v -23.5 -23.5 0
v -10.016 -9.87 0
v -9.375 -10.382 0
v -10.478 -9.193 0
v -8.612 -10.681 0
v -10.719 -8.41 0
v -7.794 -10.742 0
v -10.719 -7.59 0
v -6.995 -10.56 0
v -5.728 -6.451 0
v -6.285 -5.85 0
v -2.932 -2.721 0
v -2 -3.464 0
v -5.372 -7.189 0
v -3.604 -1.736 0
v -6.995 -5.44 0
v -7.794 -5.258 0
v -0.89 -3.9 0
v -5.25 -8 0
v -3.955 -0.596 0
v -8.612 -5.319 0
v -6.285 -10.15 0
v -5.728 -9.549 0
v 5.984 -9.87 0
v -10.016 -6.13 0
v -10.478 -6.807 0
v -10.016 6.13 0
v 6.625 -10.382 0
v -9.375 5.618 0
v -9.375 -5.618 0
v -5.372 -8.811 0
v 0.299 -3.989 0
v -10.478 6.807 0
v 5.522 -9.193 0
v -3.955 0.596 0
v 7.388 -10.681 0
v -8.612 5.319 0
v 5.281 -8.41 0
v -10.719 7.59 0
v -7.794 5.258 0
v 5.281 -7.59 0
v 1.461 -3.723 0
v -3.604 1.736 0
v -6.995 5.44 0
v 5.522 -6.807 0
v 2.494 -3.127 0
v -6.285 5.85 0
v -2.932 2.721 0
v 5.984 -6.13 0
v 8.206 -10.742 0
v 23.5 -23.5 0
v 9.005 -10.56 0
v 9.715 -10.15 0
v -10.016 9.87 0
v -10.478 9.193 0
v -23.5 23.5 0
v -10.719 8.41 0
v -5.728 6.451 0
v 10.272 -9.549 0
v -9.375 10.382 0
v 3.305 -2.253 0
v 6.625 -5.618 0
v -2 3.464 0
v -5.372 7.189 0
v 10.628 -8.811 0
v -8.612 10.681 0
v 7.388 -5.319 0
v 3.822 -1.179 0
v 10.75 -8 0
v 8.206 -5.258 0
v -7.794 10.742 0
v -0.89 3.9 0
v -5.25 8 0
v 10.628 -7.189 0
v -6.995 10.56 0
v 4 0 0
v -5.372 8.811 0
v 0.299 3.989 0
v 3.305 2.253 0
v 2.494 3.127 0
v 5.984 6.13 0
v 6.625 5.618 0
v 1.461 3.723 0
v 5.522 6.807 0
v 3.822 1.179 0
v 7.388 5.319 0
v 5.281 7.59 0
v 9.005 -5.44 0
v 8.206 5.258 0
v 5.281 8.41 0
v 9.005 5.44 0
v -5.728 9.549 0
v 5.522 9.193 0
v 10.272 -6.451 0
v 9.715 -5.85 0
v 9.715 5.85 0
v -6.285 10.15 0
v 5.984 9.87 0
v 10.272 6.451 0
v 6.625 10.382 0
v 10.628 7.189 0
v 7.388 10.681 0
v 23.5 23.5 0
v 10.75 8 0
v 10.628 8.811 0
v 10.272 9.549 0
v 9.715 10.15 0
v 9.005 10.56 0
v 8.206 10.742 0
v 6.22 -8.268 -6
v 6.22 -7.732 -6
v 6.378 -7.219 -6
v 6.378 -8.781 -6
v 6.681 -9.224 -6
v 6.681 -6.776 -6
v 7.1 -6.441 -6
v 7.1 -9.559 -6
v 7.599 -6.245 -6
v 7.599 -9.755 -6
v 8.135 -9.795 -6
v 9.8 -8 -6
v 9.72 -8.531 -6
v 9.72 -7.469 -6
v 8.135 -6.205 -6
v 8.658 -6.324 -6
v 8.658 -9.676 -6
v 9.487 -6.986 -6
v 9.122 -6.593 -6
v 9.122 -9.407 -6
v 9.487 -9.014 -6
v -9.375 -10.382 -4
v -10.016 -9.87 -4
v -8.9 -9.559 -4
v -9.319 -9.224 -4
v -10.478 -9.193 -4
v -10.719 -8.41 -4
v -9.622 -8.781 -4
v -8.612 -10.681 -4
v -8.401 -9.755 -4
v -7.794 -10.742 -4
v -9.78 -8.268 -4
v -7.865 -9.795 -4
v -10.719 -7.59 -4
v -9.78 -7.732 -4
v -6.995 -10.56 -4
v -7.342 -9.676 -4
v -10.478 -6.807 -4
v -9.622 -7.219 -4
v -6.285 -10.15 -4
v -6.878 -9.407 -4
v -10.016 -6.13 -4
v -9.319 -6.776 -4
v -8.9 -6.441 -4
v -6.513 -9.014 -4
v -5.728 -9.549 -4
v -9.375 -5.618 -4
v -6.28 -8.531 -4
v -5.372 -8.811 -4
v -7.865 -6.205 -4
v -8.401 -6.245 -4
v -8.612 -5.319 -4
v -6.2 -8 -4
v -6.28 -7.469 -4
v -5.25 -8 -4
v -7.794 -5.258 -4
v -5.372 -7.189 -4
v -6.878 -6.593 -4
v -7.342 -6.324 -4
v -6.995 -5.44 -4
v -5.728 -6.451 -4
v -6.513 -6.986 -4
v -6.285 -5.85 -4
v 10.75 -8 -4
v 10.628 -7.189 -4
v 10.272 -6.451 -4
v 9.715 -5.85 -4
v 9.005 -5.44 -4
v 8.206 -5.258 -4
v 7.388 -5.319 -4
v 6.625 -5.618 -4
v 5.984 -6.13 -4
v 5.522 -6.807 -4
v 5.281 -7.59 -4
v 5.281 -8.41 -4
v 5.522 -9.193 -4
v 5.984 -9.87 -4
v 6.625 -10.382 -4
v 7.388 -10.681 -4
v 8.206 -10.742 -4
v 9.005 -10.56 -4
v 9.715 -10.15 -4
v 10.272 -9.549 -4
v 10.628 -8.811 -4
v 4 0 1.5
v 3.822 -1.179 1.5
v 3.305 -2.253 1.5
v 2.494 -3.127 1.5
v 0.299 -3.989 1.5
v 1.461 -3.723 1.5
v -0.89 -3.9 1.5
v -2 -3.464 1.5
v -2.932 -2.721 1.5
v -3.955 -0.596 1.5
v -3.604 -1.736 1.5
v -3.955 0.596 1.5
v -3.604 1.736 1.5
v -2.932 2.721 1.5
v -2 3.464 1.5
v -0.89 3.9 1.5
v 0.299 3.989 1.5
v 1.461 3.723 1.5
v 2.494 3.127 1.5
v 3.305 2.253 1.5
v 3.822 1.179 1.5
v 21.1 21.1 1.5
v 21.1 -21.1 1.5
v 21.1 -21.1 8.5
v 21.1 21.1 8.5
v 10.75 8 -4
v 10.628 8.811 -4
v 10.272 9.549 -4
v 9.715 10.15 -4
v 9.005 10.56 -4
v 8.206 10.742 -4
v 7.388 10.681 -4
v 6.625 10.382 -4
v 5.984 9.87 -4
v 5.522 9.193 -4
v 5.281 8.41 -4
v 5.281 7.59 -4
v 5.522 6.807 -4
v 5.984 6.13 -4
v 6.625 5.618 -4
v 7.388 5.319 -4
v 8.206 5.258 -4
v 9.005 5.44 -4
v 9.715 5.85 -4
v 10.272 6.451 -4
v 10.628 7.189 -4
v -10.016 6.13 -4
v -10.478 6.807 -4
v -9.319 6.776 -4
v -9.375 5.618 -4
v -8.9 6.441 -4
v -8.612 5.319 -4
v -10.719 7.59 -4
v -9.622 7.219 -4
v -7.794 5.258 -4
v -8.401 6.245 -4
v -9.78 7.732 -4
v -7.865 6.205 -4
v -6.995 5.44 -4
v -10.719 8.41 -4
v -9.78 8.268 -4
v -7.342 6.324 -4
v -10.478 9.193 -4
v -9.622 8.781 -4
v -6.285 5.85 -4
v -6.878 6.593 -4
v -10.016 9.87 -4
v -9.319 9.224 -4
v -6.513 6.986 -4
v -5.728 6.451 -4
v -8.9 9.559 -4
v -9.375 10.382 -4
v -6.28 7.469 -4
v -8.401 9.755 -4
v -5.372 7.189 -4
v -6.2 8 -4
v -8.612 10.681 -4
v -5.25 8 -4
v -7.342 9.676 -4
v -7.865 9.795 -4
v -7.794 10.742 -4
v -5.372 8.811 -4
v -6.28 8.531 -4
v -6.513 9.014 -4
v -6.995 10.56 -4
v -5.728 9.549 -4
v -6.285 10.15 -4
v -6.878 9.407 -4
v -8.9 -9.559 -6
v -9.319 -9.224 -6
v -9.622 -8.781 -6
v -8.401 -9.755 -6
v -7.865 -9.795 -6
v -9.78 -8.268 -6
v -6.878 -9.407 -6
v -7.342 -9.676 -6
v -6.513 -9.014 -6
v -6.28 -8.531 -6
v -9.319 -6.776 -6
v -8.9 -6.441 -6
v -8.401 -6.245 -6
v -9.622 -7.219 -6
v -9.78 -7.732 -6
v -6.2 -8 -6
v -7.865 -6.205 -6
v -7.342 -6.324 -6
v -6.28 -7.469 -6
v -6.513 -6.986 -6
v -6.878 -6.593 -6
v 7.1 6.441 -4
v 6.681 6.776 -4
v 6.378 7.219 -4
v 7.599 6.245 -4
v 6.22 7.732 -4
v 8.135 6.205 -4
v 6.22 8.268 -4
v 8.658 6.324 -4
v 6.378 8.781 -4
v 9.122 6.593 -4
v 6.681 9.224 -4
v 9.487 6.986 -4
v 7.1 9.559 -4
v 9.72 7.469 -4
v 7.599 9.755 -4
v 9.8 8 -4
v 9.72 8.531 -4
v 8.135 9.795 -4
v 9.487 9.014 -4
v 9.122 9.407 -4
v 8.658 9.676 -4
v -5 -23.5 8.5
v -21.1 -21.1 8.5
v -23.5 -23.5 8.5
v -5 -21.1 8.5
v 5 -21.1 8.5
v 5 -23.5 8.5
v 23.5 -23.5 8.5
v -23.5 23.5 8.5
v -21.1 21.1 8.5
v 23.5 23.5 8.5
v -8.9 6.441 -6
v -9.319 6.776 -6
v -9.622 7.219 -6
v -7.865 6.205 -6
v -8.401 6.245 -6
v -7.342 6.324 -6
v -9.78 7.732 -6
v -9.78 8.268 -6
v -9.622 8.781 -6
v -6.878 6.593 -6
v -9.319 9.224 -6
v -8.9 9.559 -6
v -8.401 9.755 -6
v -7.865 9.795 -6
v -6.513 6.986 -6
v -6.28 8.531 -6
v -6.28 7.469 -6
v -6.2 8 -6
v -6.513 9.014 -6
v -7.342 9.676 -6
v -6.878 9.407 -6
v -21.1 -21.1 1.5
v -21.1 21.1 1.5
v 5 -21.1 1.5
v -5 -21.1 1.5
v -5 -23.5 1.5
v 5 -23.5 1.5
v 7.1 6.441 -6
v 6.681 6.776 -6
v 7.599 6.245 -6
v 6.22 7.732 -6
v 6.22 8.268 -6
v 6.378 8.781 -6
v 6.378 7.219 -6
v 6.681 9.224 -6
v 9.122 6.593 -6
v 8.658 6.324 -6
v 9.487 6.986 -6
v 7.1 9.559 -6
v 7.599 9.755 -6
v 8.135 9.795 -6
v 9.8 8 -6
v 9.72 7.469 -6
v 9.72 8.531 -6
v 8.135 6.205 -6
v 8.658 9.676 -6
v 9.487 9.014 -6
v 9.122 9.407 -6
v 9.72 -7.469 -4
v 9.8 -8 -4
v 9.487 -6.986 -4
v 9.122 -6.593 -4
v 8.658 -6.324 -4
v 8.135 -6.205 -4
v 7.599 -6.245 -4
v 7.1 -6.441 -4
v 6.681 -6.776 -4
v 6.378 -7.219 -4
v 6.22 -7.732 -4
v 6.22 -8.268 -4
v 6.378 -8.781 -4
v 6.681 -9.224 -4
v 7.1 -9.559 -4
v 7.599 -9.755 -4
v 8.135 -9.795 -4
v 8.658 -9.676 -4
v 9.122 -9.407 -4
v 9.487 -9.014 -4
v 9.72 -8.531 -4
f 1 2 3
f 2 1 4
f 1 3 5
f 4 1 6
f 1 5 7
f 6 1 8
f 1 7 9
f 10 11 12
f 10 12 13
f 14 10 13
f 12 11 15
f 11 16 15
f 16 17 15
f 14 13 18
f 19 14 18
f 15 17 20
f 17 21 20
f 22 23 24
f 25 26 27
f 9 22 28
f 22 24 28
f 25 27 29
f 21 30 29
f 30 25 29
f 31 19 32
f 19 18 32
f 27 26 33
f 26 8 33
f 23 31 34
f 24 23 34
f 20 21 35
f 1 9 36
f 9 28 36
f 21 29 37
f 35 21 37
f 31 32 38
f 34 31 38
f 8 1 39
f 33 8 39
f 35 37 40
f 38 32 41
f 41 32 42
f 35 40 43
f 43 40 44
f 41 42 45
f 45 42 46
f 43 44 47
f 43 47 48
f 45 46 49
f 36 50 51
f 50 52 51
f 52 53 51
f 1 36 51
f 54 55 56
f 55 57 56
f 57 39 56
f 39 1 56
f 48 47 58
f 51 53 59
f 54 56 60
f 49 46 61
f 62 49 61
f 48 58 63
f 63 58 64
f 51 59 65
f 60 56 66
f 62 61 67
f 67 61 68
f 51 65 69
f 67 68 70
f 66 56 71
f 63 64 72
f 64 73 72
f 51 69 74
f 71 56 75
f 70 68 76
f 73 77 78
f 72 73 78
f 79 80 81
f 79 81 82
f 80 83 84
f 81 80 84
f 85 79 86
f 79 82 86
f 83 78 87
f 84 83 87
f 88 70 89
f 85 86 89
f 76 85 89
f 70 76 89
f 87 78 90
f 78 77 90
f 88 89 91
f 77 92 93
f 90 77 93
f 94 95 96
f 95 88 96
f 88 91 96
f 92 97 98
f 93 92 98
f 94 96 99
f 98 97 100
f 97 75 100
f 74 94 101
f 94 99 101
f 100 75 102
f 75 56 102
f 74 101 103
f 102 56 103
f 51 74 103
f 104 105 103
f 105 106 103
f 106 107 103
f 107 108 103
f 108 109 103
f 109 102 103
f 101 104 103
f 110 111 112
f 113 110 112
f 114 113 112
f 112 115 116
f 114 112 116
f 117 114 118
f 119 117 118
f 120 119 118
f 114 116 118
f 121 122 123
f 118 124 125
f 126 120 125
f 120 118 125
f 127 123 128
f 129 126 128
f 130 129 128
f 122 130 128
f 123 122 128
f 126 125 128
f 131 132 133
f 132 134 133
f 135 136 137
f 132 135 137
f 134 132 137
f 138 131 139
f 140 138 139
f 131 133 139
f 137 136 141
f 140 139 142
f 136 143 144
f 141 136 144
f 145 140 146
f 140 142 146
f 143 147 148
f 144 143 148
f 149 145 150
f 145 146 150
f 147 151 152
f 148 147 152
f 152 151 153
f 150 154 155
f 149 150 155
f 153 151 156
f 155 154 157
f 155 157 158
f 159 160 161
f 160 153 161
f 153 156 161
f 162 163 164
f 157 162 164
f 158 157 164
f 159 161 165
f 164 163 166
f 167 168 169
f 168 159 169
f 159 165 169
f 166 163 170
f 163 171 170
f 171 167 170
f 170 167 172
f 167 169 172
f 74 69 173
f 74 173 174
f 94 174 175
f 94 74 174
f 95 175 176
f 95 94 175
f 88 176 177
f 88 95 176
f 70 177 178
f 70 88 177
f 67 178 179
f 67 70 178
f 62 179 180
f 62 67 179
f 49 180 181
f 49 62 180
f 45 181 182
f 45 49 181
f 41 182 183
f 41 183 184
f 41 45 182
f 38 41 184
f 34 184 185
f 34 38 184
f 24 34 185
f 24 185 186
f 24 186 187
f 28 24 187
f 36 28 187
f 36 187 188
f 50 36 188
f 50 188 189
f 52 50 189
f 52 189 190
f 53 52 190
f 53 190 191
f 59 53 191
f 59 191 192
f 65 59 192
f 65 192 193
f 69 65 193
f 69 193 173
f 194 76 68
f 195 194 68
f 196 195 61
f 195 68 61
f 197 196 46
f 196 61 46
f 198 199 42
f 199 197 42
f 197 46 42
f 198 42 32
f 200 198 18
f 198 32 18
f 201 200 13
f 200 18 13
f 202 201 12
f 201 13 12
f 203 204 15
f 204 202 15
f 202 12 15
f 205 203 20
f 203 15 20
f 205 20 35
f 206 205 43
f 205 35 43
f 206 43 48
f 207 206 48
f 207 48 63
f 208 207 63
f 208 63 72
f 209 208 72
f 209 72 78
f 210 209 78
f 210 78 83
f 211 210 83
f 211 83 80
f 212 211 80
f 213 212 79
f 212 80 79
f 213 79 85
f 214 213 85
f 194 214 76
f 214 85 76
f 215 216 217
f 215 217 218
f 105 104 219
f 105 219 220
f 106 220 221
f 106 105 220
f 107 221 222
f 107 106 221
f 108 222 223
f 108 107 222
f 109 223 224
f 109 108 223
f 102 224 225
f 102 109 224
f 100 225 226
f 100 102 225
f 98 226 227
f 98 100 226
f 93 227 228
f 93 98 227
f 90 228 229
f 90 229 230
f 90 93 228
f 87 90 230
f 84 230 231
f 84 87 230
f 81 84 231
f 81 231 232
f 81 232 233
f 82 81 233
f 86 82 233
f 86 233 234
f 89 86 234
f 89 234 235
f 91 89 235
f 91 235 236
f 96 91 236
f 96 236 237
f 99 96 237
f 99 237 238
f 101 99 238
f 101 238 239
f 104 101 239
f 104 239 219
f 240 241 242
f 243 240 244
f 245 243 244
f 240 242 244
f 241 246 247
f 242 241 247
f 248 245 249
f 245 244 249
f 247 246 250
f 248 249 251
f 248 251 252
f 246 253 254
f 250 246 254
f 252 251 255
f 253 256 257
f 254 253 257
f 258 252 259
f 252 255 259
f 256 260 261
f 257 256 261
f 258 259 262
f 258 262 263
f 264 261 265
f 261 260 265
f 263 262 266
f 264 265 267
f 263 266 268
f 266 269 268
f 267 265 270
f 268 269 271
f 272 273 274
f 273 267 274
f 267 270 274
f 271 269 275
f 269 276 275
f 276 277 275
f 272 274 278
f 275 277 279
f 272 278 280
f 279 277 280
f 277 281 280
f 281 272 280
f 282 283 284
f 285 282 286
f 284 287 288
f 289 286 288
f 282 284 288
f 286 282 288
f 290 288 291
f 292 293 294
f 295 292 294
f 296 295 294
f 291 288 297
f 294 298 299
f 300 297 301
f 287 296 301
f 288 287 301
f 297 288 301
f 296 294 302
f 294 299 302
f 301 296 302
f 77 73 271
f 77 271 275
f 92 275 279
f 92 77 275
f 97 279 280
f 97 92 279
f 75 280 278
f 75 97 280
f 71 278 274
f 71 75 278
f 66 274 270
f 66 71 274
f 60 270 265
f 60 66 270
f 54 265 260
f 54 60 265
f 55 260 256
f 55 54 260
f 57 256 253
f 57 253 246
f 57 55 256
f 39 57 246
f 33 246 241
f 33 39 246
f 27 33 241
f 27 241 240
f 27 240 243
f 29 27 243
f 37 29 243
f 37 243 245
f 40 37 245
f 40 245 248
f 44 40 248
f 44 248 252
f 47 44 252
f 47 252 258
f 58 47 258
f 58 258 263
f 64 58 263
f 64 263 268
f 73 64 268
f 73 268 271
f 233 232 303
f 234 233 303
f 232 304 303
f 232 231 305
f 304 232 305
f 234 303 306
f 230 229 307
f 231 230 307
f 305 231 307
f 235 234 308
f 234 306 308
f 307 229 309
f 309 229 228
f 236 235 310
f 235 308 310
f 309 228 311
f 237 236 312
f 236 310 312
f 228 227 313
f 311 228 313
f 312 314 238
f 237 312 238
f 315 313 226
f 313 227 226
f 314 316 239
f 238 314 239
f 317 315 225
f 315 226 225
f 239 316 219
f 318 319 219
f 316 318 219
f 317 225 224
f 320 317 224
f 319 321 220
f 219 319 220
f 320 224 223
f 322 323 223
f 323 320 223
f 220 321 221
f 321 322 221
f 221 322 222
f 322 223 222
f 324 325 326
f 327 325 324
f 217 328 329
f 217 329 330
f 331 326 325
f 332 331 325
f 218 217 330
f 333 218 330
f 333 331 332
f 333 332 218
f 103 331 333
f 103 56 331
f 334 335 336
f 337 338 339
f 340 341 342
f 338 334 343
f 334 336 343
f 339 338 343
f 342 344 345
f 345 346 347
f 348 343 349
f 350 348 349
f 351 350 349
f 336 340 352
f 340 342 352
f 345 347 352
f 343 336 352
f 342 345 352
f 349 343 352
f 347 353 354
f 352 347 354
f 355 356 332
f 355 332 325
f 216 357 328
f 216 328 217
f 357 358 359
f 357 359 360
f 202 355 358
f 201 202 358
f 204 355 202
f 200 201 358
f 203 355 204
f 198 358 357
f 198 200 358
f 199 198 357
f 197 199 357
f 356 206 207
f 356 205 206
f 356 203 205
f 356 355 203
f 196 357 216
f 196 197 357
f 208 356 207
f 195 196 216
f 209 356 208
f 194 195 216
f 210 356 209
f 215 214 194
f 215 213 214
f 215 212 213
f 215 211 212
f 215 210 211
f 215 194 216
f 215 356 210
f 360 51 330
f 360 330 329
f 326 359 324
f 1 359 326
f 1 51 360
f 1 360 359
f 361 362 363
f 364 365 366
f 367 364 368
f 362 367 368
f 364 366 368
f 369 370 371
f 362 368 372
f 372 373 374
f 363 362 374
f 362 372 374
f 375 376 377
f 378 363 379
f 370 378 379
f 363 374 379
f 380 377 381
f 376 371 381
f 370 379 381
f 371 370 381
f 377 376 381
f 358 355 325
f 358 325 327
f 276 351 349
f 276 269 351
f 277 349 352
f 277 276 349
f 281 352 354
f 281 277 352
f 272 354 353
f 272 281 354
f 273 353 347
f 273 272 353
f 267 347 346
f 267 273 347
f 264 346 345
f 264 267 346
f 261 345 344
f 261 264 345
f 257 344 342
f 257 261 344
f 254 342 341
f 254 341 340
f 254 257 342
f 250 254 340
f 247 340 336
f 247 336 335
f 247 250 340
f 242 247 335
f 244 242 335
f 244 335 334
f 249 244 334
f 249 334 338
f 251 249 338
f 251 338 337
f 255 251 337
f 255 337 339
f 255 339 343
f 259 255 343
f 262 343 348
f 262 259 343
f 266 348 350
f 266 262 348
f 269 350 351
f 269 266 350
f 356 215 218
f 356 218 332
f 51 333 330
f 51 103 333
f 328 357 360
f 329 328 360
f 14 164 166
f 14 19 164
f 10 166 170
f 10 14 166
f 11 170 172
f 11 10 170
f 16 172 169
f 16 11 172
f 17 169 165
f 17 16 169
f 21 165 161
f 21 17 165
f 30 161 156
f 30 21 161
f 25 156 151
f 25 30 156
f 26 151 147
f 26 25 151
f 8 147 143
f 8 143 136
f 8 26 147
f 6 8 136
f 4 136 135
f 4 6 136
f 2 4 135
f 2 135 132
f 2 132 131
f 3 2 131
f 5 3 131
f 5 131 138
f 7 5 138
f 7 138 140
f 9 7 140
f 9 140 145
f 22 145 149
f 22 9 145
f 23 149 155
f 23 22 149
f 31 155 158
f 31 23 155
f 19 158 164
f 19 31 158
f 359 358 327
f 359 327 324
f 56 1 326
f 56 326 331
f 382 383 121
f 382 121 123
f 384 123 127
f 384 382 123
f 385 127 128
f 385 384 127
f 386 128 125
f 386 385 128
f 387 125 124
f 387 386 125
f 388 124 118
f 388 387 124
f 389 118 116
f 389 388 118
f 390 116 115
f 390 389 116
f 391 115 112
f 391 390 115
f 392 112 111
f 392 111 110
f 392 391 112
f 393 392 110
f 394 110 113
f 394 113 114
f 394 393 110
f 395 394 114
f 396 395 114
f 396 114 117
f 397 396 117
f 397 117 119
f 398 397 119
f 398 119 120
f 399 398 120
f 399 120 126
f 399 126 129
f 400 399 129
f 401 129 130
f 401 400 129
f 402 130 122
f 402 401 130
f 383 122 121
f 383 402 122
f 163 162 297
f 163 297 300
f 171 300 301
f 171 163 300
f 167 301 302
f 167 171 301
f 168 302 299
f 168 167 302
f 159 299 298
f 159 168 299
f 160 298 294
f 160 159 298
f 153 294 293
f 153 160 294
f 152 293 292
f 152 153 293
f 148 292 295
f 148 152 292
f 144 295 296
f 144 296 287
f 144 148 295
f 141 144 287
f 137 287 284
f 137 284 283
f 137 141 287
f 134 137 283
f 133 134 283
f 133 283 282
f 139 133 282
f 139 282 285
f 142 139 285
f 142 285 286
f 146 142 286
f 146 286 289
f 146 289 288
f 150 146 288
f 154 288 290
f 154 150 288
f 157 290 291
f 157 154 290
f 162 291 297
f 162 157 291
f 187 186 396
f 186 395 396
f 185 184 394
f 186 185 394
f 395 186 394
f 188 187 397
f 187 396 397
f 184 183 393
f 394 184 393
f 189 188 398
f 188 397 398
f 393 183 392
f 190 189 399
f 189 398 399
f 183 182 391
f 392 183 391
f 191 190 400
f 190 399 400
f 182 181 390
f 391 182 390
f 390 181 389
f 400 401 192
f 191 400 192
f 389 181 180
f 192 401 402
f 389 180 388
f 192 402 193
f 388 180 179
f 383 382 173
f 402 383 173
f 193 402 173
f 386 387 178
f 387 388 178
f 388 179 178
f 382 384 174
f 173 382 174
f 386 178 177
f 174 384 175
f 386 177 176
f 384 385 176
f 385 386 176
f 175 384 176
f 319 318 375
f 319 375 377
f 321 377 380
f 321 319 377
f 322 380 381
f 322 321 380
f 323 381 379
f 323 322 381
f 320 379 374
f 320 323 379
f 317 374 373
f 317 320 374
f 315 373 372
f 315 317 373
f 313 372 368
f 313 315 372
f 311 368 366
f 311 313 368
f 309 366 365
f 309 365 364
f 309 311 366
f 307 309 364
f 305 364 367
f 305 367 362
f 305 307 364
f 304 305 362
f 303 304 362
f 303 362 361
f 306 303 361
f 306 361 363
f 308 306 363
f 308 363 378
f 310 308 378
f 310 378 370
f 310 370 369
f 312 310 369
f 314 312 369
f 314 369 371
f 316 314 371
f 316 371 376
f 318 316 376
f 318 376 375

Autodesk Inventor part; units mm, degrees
ref_plane "YZ Plane" through (0, 0, 0) normal (1, 0, 0) x (0, 1, 0)
ref_plane "XZ Plane" through (0, 0, 0) normal (0, 1, 0) x (-1, 0, 0)
ref_plane "XY Plane" through (0, 0, 0) normal (0, 0, 1) x (1, 0, 0)
sketch "Sketch1" plane through (0, 0, 0) normal (0, 0, 1) x (1, 0, 0)
  line L0 (-21.1, -21.1) -> (21.1, -21.1)
  line L1 (21.1, -21.1) -> (21.1, 21.1)
  line L2 (21.1, 21.1) -> (-21.1, 21.1)
  line L3 (-21.1, 21.1) -> (-21.1, -21.1)
  line L4 (-21.1, -21.1) -> (21.1, 21.1) construction
  line L5 (21.1, -21.1) -> (-21.1, 21.1) construction
  line L6 (-23.5, 23.5) -> (23.5, 23.5)
  line L7 (23.5, 23.5) -> (23.5, -23.5)
  line L8 (23.5, -23.5) -> (-23.5, -23.5)
  line L9 (-23.5, -23.5) -> (-23.5, 23.5)
  line L10 (-23.5, 23.5) -> (23.5, -23.5) construction
  line L11 (23.5, 23.5) -> (-23.5, -23.5) construction
  line L12 (-5, -21.1) -> (-5, -23.5)
  line L13 (5, -21.1) -> (5, -23.5)
  circle A0 centre (8, 8) radius 1.8
  circle A1 centre (8, -8) radius 1.8
  circle A2 centre (-8, -8) radius 1.8
  circle A3 centre (-8, 8) radius 1.8
  line L14 (-11, 11) -> (11, -11) construction
  line L15 (11, 11) -> (-11, -11) construction
  circle A4 centre (0, 0) radius 4
  circle A5 centre (-8, 8) radius 2.75
  circle A6 centre (-8, -8) radius 2.75
  circle A7 centre (8, 8) radius 2.75
  circle A8 centre (8, -8) radius 2.75
  dimension "d0" = 42.2
  dimension "d1" = 42.2
  dimension "d2" = 47
  dimension "d3" = 47
  dimension "d4" = 10
  dimension "d5" = 5
  dimension "d6" = 3.6
  dimension "d7" = 3.6
  dimension "d8" = 3.6
  dimension "d9" = 3.6
  dimension "d10" = 16
  dimension "d11" = 16
  dimension "d12" = 16
  dimension "d13" = 8
  dimension "d20" = 8
  dimension "d21" = 5.5
  dimension "d22" = 5.5
  dimension "d23" = 5.5
  dimension "d24" = 5.5
extrude "Extrusion1" add sketch "Sketch1" along normal blind 8.5 contours L0 L12 L8 L9 L6 L7 L13 L1 L2 L3
extrude "Extrusion2" add sketch "Sketch1" along normal blind 1.5 contours L3 L2 L1 L0 | L0 L13 L8 L12 | A0 | A1 | A2 | A3 | A5 | A6 | A7 | A8
extrude "Extrusion3" add sketch "Sketch1" against normal blind 4 contours A0 | A1 | A2 | A3 | A5 | A6 | A7 | A8
extrude "Extrusion4" add sketch "Sketch1" against normal blind 6 contours A0 | A1 | A2 | A3
properties part number "MagEncHolder"
